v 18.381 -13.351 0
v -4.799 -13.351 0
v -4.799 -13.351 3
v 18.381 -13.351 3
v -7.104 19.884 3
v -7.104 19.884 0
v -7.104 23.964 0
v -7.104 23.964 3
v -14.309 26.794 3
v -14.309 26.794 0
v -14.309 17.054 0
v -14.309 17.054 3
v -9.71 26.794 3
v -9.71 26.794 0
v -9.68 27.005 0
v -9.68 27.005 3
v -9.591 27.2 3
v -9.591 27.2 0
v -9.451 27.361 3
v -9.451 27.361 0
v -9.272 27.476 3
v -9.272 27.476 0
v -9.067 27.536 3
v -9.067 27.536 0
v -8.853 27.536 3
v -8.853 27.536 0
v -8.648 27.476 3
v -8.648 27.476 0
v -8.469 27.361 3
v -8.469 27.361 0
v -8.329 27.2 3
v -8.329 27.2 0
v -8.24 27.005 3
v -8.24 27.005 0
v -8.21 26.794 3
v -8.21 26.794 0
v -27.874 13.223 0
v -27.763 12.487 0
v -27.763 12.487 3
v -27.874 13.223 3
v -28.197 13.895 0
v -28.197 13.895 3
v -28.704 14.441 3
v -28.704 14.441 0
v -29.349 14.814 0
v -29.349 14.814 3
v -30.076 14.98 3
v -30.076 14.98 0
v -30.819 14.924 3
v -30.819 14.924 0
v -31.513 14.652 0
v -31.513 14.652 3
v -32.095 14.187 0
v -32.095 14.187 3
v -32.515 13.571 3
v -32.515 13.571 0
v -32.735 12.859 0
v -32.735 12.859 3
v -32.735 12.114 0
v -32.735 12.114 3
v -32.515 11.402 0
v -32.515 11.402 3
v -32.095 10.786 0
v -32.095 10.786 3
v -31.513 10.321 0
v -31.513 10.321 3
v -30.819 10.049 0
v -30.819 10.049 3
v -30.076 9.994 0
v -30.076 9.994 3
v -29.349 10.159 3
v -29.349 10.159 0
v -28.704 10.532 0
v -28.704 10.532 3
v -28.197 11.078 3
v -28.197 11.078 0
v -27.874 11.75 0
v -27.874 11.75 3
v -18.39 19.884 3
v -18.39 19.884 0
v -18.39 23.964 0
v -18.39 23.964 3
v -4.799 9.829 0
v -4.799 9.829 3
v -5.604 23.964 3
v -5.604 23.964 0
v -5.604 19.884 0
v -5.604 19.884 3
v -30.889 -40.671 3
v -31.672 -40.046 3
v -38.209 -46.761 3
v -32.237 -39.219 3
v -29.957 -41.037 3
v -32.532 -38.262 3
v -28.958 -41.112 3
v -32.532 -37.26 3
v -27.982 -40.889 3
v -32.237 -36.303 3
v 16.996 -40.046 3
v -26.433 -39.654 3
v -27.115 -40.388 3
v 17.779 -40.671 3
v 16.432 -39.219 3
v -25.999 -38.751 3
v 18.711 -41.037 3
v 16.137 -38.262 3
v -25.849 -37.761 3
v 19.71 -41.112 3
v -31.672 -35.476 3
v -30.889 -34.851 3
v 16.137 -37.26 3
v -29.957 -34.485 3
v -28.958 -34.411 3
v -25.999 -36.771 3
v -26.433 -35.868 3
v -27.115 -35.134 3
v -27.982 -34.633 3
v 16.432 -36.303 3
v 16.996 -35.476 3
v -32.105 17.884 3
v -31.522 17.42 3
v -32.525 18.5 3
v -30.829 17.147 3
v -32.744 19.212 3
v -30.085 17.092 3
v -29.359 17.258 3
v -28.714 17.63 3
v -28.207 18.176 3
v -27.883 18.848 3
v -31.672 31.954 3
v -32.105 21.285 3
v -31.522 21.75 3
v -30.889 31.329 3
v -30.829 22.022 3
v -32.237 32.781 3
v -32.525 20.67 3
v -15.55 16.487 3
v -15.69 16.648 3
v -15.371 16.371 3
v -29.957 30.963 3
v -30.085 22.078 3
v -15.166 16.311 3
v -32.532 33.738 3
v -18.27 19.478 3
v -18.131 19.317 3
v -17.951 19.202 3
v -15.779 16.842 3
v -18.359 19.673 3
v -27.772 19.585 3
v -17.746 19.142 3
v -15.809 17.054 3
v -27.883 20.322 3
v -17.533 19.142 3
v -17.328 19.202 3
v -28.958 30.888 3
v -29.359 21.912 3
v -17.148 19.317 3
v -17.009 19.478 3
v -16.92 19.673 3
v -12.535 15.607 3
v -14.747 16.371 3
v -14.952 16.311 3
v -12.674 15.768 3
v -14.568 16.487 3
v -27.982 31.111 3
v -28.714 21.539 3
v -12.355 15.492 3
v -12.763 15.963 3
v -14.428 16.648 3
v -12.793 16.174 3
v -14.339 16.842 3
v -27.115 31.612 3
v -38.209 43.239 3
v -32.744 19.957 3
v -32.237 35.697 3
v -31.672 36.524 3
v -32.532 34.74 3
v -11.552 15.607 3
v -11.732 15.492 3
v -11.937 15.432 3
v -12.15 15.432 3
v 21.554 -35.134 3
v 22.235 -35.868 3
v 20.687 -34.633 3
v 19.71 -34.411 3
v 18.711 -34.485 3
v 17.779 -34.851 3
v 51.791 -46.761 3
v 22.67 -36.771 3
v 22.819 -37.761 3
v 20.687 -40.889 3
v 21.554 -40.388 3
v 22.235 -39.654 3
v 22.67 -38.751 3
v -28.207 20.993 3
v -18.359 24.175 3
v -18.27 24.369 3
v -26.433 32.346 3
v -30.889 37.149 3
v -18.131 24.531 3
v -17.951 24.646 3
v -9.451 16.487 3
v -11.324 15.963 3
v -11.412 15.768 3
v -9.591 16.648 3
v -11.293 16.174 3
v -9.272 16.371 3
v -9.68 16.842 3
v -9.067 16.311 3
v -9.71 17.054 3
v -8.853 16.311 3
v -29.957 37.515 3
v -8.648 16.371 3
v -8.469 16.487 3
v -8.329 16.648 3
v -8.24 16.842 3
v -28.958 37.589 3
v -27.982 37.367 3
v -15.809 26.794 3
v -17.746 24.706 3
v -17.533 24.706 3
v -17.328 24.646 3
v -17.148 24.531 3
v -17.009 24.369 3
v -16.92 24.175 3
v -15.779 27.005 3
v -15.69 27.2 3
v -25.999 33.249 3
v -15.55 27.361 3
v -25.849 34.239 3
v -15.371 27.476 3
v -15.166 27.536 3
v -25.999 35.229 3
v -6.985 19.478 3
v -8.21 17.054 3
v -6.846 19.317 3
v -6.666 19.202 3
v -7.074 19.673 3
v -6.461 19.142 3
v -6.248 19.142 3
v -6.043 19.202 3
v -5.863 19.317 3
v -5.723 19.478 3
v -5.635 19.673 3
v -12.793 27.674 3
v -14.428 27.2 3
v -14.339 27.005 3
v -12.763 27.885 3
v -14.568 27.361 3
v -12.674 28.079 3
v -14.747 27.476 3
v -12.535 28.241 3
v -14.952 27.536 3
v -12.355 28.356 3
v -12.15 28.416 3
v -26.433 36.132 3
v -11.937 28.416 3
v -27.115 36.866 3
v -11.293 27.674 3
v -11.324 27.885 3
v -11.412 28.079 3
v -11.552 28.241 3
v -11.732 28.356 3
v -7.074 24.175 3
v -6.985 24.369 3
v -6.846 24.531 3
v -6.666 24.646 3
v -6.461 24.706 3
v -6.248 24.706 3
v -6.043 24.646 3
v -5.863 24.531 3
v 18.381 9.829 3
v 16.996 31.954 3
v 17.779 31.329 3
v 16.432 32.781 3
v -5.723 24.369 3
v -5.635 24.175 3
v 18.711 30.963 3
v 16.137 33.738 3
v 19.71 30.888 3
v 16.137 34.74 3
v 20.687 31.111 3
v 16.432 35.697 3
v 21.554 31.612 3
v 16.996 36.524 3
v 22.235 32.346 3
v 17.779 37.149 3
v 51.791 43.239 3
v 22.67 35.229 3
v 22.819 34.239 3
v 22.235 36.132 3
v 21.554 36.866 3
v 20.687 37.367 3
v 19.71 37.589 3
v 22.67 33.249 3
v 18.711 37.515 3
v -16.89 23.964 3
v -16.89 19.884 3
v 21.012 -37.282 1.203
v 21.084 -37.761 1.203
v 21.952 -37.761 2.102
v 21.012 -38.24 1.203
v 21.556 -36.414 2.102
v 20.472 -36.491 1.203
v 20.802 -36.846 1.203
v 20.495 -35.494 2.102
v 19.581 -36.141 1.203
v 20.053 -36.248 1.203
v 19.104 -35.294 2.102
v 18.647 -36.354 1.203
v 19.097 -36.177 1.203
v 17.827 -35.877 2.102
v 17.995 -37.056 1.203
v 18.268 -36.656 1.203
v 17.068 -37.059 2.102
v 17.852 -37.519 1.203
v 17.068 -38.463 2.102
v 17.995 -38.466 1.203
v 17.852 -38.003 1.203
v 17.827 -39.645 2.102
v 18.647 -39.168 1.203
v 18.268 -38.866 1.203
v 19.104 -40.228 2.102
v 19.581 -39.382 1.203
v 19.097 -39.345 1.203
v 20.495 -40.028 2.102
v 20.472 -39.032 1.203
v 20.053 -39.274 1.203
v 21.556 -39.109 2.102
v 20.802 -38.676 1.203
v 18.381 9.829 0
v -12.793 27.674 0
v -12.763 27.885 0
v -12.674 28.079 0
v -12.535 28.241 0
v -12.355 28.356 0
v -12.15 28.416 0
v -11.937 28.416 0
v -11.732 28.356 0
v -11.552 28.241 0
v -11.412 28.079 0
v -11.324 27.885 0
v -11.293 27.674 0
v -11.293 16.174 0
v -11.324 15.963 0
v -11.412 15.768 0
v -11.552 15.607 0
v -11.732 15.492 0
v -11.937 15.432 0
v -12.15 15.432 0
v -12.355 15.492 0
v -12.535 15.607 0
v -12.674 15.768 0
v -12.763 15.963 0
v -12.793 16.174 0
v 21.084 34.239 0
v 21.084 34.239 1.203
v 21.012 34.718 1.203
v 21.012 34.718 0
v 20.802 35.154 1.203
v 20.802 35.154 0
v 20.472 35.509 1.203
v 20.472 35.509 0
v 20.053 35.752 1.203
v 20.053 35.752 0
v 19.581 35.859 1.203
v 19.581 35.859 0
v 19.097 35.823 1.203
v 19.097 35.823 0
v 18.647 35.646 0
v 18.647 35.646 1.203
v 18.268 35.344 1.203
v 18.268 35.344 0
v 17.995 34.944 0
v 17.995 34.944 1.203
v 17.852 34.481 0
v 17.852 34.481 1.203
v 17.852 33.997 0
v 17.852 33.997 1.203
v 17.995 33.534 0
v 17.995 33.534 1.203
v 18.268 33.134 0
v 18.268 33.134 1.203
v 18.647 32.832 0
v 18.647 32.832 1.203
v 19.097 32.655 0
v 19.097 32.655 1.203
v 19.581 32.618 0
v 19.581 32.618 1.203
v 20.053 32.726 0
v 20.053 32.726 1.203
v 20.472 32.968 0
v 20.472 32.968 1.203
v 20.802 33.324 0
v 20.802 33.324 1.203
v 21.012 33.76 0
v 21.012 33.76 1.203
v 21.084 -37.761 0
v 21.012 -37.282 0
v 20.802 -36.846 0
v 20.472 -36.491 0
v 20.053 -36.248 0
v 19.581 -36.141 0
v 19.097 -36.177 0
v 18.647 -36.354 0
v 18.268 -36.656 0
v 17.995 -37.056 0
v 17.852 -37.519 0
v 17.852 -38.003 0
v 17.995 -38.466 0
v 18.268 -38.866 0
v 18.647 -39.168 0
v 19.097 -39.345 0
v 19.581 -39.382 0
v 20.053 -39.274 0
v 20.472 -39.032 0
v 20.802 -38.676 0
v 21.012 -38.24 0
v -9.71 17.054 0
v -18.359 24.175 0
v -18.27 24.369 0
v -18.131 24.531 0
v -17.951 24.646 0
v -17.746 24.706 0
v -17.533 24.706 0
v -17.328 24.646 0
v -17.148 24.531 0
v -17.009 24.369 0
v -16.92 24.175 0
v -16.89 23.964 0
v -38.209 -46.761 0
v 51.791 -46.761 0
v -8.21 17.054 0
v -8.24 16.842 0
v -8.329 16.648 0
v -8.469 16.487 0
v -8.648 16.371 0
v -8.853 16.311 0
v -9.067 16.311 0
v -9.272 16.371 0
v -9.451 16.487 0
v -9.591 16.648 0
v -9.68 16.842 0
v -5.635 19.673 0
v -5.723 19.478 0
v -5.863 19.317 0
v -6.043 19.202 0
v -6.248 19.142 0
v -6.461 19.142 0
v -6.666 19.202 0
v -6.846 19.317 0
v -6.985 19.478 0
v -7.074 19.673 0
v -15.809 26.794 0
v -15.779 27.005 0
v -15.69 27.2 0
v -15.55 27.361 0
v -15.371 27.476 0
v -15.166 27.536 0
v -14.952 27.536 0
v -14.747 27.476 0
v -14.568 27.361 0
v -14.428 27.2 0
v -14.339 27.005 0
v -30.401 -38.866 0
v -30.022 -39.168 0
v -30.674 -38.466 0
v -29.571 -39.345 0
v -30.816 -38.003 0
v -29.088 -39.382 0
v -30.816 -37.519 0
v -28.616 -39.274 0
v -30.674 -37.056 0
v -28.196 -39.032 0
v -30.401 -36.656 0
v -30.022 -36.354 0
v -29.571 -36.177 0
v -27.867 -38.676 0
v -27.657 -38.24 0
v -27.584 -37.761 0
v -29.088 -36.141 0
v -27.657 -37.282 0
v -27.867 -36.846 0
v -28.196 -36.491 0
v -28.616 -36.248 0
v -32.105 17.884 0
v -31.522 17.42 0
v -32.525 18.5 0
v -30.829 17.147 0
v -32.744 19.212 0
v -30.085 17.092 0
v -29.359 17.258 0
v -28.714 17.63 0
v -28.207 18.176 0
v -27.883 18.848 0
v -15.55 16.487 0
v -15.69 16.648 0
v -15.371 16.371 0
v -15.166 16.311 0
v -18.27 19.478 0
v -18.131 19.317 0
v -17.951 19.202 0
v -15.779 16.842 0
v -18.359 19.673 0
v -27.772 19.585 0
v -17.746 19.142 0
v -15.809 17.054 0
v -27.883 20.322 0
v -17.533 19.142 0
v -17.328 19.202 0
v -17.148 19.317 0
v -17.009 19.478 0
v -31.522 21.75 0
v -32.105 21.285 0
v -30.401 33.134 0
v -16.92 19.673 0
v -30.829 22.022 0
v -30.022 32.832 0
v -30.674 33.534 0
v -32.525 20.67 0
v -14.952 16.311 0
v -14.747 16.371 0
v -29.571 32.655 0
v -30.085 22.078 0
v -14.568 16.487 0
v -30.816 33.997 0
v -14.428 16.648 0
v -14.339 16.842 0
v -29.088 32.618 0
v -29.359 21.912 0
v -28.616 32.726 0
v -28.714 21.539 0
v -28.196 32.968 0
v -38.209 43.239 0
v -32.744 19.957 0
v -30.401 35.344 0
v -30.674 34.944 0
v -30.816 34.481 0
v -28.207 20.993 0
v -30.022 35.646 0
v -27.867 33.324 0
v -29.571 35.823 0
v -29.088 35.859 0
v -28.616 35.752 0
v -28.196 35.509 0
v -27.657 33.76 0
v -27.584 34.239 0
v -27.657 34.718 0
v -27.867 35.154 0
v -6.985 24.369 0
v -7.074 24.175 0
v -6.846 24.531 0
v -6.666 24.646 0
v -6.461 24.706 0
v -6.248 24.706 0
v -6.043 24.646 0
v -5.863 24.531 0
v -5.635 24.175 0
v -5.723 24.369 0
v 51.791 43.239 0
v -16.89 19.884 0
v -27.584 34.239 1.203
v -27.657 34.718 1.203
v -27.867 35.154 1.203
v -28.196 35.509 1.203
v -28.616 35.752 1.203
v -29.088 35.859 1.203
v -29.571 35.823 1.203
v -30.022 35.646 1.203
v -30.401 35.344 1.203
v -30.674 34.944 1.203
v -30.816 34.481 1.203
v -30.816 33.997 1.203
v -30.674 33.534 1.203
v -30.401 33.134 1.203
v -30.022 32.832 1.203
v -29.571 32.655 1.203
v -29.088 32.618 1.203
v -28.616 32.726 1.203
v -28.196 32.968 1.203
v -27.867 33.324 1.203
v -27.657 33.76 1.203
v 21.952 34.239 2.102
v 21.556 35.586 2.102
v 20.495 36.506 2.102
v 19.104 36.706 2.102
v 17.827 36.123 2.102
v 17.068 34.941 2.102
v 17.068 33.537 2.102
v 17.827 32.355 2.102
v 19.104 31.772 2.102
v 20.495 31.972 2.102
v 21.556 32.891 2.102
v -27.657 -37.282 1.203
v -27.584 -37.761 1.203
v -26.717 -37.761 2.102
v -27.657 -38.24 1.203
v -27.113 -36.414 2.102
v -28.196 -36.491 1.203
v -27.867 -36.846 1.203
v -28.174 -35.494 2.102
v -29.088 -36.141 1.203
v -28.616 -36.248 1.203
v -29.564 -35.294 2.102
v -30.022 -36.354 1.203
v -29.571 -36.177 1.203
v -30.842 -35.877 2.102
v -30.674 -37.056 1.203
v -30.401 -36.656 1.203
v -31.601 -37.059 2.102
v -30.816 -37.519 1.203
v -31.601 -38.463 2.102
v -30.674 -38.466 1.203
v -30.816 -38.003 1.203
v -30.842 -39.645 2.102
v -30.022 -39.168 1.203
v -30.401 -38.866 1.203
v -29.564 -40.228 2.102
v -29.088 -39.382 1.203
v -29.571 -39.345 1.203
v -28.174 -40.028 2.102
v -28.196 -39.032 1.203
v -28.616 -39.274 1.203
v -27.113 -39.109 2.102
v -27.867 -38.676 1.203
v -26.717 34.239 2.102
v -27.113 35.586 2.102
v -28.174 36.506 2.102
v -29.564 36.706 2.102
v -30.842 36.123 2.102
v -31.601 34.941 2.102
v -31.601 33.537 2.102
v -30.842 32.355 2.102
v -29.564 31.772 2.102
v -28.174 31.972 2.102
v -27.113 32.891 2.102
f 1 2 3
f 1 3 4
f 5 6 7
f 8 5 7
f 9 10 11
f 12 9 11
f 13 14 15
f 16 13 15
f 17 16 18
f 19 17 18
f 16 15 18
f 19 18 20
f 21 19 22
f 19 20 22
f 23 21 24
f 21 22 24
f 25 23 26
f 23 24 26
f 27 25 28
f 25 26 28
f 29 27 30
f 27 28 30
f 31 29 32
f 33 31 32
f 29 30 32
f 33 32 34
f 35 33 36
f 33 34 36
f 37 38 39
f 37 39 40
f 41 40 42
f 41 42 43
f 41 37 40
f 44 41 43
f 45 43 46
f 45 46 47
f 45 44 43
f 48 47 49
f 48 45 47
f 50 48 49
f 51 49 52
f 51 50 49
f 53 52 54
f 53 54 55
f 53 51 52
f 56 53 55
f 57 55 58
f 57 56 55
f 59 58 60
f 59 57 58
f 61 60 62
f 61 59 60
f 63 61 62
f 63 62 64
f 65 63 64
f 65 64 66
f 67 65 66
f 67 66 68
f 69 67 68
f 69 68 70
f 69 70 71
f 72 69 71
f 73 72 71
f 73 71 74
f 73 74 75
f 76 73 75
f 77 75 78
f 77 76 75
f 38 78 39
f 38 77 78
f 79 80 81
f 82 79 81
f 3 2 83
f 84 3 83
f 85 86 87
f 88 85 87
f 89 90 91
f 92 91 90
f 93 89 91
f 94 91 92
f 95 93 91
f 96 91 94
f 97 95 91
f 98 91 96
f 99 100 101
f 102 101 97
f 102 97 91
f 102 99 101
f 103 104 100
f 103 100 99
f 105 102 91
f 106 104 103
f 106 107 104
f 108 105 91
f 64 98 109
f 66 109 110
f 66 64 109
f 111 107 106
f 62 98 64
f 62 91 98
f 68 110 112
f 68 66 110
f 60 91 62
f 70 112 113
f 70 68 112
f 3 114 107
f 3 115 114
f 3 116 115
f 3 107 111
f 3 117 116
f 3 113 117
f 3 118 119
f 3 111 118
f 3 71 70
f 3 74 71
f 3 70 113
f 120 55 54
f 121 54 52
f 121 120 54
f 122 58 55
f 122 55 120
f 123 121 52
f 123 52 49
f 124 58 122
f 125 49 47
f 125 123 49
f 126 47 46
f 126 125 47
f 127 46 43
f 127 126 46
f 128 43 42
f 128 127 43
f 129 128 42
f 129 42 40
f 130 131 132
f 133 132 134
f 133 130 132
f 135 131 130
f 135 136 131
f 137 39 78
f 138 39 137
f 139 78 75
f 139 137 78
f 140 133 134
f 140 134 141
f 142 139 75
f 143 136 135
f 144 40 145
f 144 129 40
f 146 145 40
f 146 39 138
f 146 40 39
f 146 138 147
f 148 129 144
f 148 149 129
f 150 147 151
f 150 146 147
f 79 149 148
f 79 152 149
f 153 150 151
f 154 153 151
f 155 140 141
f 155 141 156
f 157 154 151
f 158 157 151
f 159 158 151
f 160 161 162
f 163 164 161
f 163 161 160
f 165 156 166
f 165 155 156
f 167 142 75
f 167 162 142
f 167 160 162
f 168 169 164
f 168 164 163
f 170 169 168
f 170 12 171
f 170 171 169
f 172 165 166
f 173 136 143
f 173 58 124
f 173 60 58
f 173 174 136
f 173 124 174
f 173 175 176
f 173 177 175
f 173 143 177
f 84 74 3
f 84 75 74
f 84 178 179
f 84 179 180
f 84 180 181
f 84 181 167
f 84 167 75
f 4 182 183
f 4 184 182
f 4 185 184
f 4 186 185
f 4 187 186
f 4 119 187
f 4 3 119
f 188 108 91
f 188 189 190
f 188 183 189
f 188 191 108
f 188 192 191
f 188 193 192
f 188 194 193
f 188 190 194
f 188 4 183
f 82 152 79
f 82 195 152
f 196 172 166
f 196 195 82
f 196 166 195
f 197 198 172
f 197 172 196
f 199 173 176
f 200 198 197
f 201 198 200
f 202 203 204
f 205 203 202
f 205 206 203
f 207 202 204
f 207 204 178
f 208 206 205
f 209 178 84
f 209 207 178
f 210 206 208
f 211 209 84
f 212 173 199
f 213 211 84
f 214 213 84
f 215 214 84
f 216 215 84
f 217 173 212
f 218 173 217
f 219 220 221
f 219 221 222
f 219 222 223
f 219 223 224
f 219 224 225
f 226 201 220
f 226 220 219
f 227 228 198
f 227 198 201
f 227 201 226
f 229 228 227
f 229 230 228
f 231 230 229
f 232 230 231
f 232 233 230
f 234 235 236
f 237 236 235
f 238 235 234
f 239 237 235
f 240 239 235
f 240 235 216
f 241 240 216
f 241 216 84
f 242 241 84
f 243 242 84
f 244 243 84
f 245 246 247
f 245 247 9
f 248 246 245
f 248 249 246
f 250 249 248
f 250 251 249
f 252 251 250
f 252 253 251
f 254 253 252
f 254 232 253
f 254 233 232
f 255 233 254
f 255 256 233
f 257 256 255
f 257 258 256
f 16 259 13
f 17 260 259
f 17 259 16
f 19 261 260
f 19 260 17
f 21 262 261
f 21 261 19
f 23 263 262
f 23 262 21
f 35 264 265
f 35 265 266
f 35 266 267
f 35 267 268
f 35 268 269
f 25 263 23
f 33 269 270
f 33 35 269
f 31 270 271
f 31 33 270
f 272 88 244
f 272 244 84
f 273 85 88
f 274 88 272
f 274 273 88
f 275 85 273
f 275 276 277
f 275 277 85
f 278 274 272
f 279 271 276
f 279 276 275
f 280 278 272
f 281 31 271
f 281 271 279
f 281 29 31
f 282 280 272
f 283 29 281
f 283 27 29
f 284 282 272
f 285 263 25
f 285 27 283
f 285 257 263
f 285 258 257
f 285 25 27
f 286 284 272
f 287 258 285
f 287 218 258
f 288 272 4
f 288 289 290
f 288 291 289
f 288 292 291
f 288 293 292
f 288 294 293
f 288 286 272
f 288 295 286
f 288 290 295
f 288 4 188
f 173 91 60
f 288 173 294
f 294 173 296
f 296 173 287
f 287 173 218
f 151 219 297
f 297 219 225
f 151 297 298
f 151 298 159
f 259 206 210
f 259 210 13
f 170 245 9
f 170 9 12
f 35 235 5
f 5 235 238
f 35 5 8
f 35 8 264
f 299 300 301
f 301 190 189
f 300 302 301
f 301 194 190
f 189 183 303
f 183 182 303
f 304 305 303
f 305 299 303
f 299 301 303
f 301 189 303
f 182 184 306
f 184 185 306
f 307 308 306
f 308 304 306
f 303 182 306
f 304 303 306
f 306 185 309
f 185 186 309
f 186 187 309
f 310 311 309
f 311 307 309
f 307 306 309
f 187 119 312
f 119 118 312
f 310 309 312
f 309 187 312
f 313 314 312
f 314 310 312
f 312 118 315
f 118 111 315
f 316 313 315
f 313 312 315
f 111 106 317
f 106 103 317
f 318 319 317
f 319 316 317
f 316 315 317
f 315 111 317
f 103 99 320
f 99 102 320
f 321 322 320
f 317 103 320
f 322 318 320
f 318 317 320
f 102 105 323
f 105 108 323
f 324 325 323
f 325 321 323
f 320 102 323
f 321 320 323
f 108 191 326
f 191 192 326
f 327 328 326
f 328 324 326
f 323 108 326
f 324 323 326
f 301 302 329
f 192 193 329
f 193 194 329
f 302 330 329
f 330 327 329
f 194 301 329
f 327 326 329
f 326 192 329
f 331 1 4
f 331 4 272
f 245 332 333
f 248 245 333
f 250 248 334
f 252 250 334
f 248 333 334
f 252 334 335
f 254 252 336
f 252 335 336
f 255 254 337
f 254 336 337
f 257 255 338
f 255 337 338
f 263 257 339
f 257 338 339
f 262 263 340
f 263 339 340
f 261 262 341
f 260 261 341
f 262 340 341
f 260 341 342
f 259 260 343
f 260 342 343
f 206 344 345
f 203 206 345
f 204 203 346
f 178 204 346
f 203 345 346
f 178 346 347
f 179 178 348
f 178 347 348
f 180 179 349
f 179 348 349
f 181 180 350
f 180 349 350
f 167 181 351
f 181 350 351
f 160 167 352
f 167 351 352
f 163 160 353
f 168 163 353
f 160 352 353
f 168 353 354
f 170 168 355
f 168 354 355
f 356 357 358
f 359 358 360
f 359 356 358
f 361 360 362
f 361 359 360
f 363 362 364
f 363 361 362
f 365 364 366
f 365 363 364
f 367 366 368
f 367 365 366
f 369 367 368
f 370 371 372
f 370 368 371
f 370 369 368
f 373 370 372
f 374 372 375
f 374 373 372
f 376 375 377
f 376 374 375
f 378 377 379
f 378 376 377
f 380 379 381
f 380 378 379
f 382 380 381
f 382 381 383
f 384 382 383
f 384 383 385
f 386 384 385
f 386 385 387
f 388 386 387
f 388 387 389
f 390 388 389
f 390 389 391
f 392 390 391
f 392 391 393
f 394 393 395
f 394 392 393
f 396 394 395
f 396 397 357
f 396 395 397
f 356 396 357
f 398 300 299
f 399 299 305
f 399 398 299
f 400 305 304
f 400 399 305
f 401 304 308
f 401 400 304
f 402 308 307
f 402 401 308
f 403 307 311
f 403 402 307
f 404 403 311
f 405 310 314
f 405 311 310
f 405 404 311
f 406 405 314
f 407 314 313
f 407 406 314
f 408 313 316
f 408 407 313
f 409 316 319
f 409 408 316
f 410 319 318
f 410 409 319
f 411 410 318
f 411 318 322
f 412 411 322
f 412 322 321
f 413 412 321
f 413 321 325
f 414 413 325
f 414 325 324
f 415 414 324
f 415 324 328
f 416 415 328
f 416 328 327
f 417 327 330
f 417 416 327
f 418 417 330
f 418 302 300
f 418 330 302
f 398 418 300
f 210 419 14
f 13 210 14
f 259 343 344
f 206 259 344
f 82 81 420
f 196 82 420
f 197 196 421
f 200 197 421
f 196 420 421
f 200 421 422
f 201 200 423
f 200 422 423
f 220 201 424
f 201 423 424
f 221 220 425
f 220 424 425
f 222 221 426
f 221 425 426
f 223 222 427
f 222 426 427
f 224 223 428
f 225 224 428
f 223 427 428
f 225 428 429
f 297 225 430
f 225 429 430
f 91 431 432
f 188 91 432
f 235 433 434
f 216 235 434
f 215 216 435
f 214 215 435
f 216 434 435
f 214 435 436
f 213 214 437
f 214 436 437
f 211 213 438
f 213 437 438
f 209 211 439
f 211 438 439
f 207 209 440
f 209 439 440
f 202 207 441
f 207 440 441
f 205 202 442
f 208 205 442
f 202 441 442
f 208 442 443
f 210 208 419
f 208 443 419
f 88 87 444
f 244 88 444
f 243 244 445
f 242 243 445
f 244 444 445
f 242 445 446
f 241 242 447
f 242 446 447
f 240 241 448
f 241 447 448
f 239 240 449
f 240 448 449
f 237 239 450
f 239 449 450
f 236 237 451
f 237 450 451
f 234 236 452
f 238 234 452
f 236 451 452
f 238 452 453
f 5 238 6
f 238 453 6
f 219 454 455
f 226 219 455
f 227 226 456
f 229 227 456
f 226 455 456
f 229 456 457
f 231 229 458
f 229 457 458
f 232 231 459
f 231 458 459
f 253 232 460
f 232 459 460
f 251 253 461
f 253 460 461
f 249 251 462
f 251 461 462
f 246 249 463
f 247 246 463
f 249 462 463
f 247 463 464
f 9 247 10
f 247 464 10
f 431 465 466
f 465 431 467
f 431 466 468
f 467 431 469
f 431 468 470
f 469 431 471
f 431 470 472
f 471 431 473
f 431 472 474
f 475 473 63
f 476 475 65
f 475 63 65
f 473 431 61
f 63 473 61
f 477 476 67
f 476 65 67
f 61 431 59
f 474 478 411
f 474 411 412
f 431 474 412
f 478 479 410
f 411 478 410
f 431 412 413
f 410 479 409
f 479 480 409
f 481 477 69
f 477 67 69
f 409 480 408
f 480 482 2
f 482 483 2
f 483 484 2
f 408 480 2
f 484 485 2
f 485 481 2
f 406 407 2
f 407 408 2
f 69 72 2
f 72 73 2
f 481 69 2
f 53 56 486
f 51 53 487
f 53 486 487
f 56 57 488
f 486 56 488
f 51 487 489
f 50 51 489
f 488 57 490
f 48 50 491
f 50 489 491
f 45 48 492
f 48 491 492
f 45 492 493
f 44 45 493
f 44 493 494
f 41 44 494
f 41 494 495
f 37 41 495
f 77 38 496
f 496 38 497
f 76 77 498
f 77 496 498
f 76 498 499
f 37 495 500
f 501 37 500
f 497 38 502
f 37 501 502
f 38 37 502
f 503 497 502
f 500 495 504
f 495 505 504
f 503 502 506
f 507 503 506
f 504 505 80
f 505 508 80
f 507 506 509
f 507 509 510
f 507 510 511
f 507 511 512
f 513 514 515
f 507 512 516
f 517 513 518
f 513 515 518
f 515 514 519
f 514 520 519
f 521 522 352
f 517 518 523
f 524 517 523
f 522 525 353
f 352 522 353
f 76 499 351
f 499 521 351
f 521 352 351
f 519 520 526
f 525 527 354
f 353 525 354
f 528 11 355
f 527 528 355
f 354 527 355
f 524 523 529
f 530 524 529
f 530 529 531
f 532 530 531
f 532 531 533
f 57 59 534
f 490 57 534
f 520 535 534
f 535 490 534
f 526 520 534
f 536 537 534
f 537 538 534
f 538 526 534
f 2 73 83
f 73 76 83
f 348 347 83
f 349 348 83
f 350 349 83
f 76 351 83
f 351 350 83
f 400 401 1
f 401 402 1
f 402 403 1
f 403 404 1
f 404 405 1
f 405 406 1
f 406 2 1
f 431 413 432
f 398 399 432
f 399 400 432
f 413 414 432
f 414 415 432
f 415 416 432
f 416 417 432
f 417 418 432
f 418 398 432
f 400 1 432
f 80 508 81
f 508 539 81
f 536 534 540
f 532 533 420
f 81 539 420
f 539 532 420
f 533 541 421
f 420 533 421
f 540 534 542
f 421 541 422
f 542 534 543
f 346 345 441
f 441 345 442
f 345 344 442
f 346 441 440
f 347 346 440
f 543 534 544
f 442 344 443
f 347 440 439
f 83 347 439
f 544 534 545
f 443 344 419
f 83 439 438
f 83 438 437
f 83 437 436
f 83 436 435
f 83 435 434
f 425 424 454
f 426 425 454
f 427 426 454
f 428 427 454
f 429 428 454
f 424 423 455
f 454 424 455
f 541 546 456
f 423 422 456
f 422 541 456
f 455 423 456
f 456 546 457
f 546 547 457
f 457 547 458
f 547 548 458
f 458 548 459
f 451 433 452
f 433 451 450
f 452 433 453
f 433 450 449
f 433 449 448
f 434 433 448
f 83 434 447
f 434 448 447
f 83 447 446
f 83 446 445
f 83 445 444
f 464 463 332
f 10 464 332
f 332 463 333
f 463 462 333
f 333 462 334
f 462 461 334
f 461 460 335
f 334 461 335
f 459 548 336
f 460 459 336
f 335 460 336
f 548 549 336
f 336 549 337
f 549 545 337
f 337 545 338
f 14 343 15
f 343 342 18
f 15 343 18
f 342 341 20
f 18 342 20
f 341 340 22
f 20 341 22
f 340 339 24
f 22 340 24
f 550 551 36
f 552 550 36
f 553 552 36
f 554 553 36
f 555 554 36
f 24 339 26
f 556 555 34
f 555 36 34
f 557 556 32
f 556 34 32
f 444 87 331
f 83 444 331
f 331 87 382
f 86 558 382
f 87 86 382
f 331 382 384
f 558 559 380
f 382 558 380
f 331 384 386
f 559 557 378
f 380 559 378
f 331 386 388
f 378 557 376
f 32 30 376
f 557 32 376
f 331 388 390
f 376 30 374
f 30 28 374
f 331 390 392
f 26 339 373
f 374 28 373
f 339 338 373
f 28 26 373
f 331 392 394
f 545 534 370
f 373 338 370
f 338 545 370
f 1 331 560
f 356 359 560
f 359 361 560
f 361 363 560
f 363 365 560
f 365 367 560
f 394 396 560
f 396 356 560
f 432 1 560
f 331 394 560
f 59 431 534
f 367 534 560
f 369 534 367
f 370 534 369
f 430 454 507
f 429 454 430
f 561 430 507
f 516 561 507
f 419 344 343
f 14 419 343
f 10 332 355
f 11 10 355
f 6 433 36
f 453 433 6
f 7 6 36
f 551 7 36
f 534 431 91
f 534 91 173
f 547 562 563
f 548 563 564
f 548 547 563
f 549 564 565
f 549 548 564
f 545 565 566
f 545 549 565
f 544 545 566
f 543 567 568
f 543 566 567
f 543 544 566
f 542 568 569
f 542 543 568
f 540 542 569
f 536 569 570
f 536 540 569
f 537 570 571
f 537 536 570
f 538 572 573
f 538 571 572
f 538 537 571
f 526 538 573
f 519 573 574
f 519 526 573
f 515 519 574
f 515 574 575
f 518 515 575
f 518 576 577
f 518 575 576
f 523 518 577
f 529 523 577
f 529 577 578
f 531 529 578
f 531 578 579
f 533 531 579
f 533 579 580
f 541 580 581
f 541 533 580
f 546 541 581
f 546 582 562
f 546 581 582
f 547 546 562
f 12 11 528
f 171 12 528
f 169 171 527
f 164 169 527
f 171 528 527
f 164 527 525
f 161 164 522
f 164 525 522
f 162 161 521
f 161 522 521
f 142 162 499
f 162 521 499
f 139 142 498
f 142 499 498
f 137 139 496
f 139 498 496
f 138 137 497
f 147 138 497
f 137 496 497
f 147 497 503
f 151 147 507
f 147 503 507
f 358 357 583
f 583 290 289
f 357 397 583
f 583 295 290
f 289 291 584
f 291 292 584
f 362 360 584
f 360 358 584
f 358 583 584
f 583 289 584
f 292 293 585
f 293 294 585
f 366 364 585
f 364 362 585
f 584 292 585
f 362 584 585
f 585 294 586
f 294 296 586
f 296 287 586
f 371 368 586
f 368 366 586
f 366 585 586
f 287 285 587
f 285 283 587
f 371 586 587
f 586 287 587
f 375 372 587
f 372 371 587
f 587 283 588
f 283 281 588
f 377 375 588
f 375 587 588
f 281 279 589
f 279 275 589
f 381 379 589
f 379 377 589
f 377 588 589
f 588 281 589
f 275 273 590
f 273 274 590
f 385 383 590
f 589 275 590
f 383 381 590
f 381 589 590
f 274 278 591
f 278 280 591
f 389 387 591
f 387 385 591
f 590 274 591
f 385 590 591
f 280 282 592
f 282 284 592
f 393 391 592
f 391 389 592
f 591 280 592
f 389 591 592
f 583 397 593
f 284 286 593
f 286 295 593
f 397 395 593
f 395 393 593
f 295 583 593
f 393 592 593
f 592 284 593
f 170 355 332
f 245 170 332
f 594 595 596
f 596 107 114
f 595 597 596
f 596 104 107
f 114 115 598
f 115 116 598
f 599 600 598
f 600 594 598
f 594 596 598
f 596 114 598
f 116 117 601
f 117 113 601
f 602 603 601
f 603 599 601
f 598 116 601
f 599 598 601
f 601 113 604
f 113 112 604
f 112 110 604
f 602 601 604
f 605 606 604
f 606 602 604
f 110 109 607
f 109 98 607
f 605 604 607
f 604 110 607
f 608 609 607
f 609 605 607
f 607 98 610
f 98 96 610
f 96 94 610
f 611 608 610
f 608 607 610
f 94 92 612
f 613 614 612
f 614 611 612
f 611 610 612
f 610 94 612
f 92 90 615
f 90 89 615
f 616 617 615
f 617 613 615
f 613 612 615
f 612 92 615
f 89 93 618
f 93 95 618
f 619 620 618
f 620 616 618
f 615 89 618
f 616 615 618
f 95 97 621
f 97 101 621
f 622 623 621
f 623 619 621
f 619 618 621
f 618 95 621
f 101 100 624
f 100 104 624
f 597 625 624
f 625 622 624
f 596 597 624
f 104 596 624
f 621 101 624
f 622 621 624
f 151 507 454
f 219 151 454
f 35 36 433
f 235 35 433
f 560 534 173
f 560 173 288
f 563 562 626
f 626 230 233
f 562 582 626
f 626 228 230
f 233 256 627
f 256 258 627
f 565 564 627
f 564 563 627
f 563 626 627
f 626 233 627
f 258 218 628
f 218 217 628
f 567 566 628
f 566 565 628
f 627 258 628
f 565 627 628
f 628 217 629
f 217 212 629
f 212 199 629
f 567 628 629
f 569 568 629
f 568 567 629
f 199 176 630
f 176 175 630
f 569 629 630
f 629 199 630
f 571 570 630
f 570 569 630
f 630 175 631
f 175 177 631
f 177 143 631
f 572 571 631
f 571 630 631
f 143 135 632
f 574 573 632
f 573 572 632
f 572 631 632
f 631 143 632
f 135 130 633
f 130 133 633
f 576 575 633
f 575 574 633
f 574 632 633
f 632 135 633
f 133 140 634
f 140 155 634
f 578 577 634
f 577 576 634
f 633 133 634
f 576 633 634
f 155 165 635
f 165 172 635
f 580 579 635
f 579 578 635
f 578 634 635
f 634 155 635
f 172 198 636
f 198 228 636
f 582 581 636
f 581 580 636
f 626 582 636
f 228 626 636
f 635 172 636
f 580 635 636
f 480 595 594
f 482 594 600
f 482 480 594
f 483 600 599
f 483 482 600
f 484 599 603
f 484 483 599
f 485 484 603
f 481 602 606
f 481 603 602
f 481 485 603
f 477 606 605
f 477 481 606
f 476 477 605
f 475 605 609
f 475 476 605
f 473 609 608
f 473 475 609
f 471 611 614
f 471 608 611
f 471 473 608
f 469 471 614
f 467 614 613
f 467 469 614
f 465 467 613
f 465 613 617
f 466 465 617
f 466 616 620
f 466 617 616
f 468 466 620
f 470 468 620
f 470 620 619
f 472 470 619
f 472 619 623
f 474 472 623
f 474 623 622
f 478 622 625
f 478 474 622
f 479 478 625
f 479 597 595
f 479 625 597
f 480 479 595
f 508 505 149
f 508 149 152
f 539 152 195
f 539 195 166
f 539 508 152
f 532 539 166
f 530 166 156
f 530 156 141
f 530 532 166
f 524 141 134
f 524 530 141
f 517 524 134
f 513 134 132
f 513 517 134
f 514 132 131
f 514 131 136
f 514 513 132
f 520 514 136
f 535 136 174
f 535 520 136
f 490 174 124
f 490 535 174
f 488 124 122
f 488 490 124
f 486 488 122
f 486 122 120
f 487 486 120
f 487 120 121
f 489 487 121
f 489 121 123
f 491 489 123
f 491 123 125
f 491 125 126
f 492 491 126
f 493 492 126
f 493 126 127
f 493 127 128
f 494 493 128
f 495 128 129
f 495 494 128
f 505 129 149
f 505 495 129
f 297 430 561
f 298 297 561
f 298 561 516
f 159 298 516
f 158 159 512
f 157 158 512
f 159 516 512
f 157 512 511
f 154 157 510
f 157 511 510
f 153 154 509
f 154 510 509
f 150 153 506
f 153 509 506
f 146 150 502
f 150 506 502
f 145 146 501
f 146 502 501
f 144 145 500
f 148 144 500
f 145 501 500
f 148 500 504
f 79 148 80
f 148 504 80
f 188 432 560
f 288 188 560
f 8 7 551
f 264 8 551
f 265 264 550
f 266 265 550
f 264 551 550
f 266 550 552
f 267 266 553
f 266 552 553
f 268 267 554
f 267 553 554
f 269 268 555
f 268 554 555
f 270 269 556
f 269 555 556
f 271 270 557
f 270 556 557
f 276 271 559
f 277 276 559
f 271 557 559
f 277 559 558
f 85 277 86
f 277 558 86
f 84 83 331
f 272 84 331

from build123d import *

# Parameters (mm, degrees)
CROQUIS1_W                      = 90
CROQUIS1_H                      = 90
CROQUIS1_R                      = 2.5
CROQUIS1_R_2                    = 1.625
CROQUIS1_W_2                    = 23.18
CROQUIS1_H_2                    = 23.18
SALIENTE_EXTRUIR1_DEPTH         = 3
CROQUIS2_R                      = 3.35997123
CORTAR_EXTRUIR1_DEPTH           = 1.8
CORTAR_EXTRUIR1_DRAFT           = -44
CORTAR_EXTRUIR1_PROFILE_2_DEPTH = 1.8
CORTAR_EXTRUIR1_PROFILE_2_DRAFT = -44
CORTAR_EXTRUIR1_PROFILE_3_DEPTH = 1.8
CORTAR_EXTRUIR1_PROFILE_3_DRAFT = -44
CORTAR_EXTRUIR1_PROFILE_4_DEPTH = 1.8
CORTAR_EXTRUIR1_PROFILE_4_DRAFT = -44


with BuildPart() as part:
    # Croquis1 → Saliente-Extruir1 (new body)
    with BuildSketch(Plane.XY):
        with Locations((6.790535393, -1.76108936)):
            Rectangle(CROQUIS1_W, CROQUIS1_H)
        with Locations((-30.272299079, 19.584790813)):
            Circle(CROQUIS1_R, mode=Mode.SUBTRACT)
        with Locations((-30.262724761, 12.486512925)):
            Circle(CROQUIS1_R, mode=Mode.SUBTRACT)
        with Locations((-29.209464607, 34.23891064)):
            Circle(CROQUIS1_R_2, mode=Mode.SUBTRACT)
        with Locations((19.459089133, 34.23891064)):
            Circle(CROQUIS1_R_2, mode=Mode.SUBTRACT)
        with Locations((-29.209464607, -37.76108936)):
            Circle(CROQUIS1_R_2, mode=Mode.SUBTRACT)
        with Locations((19.459089133, -37.76108936)):
            Circle(CROQUIS1_R_2, mode=Mode.SUBTRACT)
        with Locations((6.790535393, -1.76108936)):
            Rectangle(CROQUIS1_W_2, CROQUIS1_H_2, mode=Mode.SUBTRACT)
        with BuildLine():
            Line((-11.293405686, 27.67391064), (-11.293405686, 16.17391064))
            ThreePointArc((-11.293405686, 16.17391064), (-12.043405686, 15.42391064), (-12.793405686, 16.17391064))
            Line((-12.793405686, 16.17391064), (-12.793405686, 27.67391064))
            ThreePointArc((-12.793405686, 27.67391064), (-12.043405686, 28.42391064), (-11.293405686, 27.67391064))
        make_face(mode=Mode.SUBTRACT)
        with BuildLine():
            Line((-14.308998248, 26.794100575), (-14.308998248, 17.053720706))
            ThreePointArc((-14.308998248, 17.053720706), (-15.058998248, 16.303720706), (-15.808998248, 17.053720706))
            Line((-15.808998248, 17.053720706), (-15.808998248, 26.794100575))
            ThreePointArc((-15.808998248, 26.794100575), (-15.058998248, 27.544100575), (-14.308998248, 26.794100575))
        make_face(mode=Mode.SUBTRACT)
        with BuildLine():
            Line((-8.210041057, 26.794100575), (-8.210041057, 17.053720706))
            ThreePointArc((-8.210041057, 17.053720706), (-8.960041057, 16.303720706), (-9.710041057, 17.053720706))
            Line((-9.710041057, 17.053720706), (-9.710041057, 26.794100575))
            ThreePointArc((-9.710041057, 26.794100575), (-8.960041057, 27.544100575), (-8.210041057, 26.794100575))
        make_face(mode=Mode.SUBTRACT)
        with BuildLine():
            Line((-16.889510612, 23.96392892), (-16.889510612, 19.883892361))
            ThreePointArc((-16.889510612, 19.883892361), (-17.639510612, 19.133892361), (-18.389510612, 19.883892361))
            Line((-18.389510612, 19.883892361), (-18.389510612, 23.96392892))
            ThreePointArc((-18.389510612, 23.96392892), (-17.639510612, 24.71392892), (-16.889510612, 23.96392892))
        make_face(mode=Mode.SUBTRACT)
        with BuildLine():
            Line((-5.604418602, 23.96392892), (-5.604418602, 19.883892361))
            ThreePointArc((-5.604418602, 19.883892361), (-6.354418602, 19.133892361), (-7.104418602, 19.883892361))
            Line((-7.104418602, 19.883892361), (-7.104418602, 23.96392892))
            ThreePointArc((-7.104418602, 23.96392892), (-6.354418602, 24.71392892), (-5.604418602, 23.96392892))
        make_face(mode=Mode.SUBTRACT)
    extrude(amount=SALIENTE_EXTRUIR1_DEPTH)


with BuildPart() as cortar_extruir1_tool:
    # Croquis2 → Cortar-Extruir1 (with draft: the straight prism first)
    with BuildSketch(Plane.XY.offset(3)):
        with Locations((-29.209464607, 34.23891064)):
            Circle(CROQUIS2_R)
    extrude(amount=-CORTAR_EXTRUIR1_DEPTH)
    # Cortar-Extruir1: the draft: its side faces are tilted about the plane it starts from
    cortar_extruir1_sides = [cortar_extruir1_tool.faces().sort_by_distance(p)[0] for p in [
        (-32.569435837, 34.23891064, 2.1),
    ]]
    draft(cortar_extruir1_sides, Plane.XY.offset(3), CORTAR_EXTRUIR1_DRAFT)


with BuildPart() as part_1:
    add(part.part)

    # Cortar-Extruir1: cut by cortar_extruir1_tool
    add(cortar_extruir1_tool.part, mode=Mode.SUBTRACT)


with BuildPart() as cortar_extruir1_profile_2_tool:
    # Croquis2 → Cortar-Extruir1 profile 2 (with draft: the straight prism first)
    with BuildSketch(Plane.XY.offset(3)):
        with Locations((19.459089133, 34.23891064)):
            Circle(CROQUIS2_R)
    extrude(amount=-CORTAR_EXTRUIR1_PROFILE_2_DEPTH)
    # Cortar-Extruir1 profile 2: the draft: its side faces are tilted about the plane it starts from
    cortar_extruir1_profile_2_sides = [cortar_extruir1_profile_2_tool.faces().sort_by_distance(p)[0] for p in [
        (16.099117903, 34.23891064, 2.1),
    ]]
    draft(cortar_extruir1_profile_2_sides, Plane.XY.offset(3), CORTAR_EXTRUIR1_PROFILE_2_DRAFT)


with BuildPart() as part_2:
    add(part_1.part)

    # Cortar-Extruir1 profile 2: cut by cortar_extruir1_profile_2_tool
    add(cortar_extruir1_profile_2_tool.part, mode=Mode.SUBTRACT)


with BuildPart() as cortar_extruir1_profile_3_tool:
    # Croquis2 → Cortar-Extruir1 profile 3 (with draft: the straight prism first)
    with BuildSketch(Plane.XY.offset(3)):
        with Locations((19.459089133, -37.76108936)):
            Circle(CROQUIS2_R)
    extrude(amount=-CORTAR_EXTRUIR1_PROFILE_3_DEPTH)
    # Cortar-Extruir1 profile 3: the draft: its side faces are tilted about the plane it starts from
    cortar_extruir1_profile_3_sides = [cortar_extruir1_profile_3_tool.faces().sort_by_distance(p)[0] for p in [
        (16.099117903, -37.76108936, 2.1),
    ]]
    draft(cortar_extruir1_profile_3_sides, Plane.XY.offset(3), CORTAR_EXTRUIR1_PROFILE_3_DRAFT)


with BuildPart() as part_3:
    add(part_2.part)

    # Cortar-Extruir1 profile 3: cut by cortar_extruir1_profile_3_tool
    add(cortar_extruir1_profile_3_tool.part, mode=Mode.SUBTRACT)


with BuildPart() as cortar_extruir1_profile_4_tool:
    # Croquis2 → Cortar-Extruir1 profile 4 (with draft: the straight prism first)
    with BuildSketch(Plane.XY.offset(3)):
        with Locations((-29.209464607, -37.76108936)):
            Circle(CROQUIS2_R)
    extrude(amount=-CORTAR_EXTRUIR1_PROFILE_4_DEPTH)
    # Cortar-Extruir1 profile 4: the draft: its side faces are tilted about the plane it starts from
    cortar_extruir1_profile_4_sides = [cortar_extruir1_profile_4_tool.faces().sort_by_distance(p)[0] for p in [
        (-32.569435837, -37.76108936, 2.1),
    ]]
    draft(cortar_extruir1_profile_4_sides, Plane.XY.offset(3), CORTAR_EXTRUIR1_PROFILE_4_DRAFT)


with BuildPart() as part_4:
    add(part_3.part)

    # Cortar-Extruir1 profile 4: cut by cortar_extruir1_profile_4_tool
    add(cortar_extruir1_profile_4_tool.part, mode=Mode.SUBTRACT)


solid = part_4.part
